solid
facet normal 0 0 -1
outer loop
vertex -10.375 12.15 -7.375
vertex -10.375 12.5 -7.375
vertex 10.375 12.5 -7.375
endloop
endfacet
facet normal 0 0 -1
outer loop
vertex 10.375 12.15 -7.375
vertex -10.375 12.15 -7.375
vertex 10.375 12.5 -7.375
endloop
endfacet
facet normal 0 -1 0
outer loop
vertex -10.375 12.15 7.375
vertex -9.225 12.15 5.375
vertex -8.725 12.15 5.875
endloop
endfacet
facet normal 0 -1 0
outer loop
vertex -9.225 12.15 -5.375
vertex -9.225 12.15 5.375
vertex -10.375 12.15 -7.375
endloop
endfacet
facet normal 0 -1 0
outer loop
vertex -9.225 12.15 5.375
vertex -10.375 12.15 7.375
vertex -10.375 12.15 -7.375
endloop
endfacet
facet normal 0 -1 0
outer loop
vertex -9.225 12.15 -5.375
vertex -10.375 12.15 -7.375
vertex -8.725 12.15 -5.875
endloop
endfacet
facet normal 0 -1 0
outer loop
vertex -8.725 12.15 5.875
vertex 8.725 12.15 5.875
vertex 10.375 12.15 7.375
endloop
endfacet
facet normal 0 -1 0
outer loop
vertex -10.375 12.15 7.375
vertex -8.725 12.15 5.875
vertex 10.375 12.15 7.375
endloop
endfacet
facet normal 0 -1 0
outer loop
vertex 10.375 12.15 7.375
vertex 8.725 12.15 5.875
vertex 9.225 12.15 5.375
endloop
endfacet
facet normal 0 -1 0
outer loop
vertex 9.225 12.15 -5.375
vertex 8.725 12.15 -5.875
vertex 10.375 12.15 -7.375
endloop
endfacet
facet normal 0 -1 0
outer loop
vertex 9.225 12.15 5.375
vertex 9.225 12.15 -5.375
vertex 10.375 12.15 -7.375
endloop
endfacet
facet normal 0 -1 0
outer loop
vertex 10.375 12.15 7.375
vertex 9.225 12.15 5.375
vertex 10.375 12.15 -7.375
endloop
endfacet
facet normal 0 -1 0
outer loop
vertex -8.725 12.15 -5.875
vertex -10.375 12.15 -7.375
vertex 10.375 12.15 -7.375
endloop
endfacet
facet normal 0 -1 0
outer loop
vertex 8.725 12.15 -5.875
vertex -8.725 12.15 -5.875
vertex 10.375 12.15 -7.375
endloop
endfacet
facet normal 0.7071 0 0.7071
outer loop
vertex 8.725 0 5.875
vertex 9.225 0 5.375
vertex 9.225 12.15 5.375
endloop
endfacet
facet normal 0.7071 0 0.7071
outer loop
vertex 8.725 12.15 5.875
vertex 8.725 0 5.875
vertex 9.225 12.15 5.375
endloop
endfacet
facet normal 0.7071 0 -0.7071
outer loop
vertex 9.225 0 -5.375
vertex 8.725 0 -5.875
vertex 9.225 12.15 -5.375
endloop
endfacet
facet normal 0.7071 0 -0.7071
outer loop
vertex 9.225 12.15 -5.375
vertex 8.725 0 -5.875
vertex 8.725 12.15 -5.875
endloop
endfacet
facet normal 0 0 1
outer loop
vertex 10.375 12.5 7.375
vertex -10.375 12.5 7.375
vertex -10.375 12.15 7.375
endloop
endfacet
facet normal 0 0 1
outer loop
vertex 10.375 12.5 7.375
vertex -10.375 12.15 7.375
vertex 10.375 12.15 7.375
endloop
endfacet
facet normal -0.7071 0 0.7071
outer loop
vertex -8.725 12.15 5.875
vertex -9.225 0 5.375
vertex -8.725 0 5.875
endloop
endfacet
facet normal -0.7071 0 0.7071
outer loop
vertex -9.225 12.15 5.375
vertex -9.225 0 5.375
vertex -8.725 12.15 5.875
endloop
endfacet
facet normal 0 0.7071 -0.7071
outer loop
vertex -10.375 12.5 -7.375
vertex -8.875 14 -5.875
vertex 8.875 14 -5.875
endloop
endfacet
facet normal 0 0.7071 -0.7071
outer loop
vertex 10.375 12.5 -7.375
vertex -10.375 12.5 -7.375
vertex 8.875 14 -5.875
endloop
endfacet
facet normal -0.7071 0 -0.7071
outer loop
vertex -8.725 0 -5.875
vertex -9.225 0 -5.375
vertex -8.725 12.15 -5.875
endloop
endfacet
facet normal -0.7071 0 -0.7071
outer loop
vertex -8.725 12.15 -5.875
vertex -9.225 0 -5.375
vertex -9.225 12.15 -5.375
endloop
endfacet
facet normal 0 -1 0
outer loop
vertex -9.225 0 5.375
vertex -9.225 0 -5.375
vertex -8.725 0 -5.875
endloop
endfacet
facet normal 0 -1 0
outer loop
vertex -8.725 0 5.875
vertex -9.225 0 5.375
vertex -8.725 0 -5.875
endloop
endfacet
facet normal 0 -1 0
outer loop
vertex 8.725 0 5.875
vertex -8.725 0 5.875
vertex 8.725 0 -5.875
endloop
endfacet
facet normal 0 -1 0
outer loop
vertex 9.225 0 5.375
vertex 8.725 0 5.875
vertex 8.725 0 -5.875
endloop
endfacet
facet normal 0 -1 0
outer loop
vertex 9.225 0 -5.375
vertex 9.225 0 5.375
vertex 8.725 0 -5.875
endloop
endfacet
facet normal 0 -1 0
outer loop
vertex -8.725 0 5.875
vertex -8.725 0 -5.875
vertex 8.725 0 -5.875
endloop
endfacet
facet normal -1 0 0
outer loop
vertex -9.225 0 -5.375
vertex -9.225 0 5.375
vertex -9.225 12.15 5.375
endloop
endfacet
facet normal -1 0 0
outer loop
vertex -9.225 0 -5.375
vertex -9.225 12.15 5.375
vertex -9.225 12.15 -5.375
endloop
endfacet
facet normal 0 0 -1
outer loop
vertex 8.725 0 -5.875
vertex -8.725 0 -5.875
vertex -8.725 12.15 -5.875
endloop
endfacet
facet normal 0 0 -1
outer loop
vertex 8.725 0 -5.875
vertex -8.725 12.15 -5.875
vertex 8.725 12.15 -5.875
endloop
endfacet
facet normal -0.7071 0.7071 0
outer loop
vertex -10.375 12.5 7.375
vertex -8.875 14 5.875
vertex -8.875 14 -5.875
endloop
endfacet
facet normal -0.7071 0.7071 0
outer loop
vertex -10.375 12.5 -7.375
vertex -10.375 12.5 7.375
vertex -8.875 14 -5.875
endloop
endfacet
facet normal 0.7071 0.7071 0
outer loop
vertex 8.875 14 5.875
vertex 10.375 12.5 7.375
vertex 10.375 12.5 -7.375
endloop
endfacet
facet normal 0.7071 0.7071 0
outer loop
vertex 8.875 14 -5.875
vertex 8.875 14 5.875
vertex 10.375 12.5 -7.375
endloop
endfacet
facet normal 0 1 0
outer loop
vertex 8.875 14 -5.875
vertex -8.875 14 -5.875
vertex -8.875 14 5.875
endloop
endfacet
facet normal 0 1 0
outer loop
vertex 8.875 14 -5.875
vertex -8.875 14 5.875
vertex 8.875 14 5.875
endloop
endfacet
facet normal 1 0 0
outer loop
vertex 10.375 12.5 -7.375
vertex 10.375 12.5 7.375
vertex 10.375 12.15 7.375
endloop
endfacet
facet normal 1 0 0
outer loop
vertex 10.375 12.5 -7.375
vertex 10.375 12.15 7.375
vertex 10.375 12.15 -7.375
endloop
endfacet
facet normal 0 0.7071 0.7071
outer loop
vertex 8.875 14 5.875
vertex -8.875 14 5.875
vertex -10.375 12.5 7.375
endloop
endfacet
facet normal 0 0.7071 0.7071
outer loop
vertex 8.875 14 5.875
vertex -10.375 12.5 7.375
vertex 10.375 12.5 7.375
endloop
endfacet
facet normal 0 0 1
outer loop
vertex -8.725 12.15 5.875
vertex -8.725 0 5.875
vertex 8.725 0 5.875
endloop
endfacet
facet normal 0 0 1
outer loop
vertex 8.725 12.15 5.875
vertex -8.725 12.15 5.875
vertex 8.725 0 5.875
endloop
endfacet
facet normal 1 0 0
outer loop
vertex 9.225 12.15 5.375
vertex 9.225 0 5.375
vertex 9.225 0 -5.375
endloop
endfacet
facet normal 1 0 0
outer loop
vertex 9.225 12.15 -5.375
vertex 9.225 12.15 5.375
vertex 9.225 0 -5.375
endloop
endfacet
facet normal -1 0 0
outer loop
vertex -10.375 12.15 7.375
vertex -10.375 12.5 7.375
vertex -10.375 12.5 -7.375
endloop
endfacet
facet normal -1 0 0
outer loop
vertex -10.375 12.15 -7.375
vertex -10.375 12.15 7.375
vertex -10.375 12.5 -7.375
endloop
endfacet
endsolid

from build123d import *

# Parameters (mm, degrees)
SKETCH1_W           = 18.45
SKETCH1_H           = 11.75
BOSS_EXTRUDE1_DEPTH = 14
SKETCH2_W           = 20.75
SKETCH2_H           = 14.75
BOSS_EXTRUDE2_DEPTH = 1.85
CHAMFER1_SIZE       = 1.5
CHAMFER2_SIZE       = 0.5


with BuildPart() as part:
    # Sketch1 → Boss-Extrude1 (new body)
    with BuildSketch(Plane(origin=(0, 0, 0), x_dir=(1, 0, 0), z_dir=(0, 1, 0))):
        Rectangle(SKETCH1_W, SKETCH1_H)
    extrude(amount=BOSS_EXTRUDE1_DEPTH)

    # Sketch2 → Boss-Extrude2 (add)
    with BuildSketch(Plane(origin=(0, 14, 0), x_dir=(1, 0, 0), z_dir=(0, 1, 0))):
        Rectangle(SKETCH2_W, SKETCH2_H)
    extrude(amount=-BOSS_EXTRUDE2_DEPTH)

    # Chamfer1
    chamfer1_edges = [part.edges().sort_by_distance(p)[0] for p in [
        (-10.375, 14, 0),
        (0, 14, 7.375),
        (10.375, 14, 0),
        (0, 14, -7.375),
    ]]
    chamfer(chamfer1_edges, length=CHAMFER1_SIZE)

    # Chamfer2
    chamfer2_edges = [part.edges().sort_by_distance(p)[0] for p in [
        (-9.225, 6.075, -5.875),
        (9.225, 6.075, -5.875),
        (9.225, 6.075, 5.875),
        (-9.225, 6.075, 5.875),
    ]]
    chamfer(chamfer2_edges, length=CHAMFER2_SIZE)


solid = part.part
